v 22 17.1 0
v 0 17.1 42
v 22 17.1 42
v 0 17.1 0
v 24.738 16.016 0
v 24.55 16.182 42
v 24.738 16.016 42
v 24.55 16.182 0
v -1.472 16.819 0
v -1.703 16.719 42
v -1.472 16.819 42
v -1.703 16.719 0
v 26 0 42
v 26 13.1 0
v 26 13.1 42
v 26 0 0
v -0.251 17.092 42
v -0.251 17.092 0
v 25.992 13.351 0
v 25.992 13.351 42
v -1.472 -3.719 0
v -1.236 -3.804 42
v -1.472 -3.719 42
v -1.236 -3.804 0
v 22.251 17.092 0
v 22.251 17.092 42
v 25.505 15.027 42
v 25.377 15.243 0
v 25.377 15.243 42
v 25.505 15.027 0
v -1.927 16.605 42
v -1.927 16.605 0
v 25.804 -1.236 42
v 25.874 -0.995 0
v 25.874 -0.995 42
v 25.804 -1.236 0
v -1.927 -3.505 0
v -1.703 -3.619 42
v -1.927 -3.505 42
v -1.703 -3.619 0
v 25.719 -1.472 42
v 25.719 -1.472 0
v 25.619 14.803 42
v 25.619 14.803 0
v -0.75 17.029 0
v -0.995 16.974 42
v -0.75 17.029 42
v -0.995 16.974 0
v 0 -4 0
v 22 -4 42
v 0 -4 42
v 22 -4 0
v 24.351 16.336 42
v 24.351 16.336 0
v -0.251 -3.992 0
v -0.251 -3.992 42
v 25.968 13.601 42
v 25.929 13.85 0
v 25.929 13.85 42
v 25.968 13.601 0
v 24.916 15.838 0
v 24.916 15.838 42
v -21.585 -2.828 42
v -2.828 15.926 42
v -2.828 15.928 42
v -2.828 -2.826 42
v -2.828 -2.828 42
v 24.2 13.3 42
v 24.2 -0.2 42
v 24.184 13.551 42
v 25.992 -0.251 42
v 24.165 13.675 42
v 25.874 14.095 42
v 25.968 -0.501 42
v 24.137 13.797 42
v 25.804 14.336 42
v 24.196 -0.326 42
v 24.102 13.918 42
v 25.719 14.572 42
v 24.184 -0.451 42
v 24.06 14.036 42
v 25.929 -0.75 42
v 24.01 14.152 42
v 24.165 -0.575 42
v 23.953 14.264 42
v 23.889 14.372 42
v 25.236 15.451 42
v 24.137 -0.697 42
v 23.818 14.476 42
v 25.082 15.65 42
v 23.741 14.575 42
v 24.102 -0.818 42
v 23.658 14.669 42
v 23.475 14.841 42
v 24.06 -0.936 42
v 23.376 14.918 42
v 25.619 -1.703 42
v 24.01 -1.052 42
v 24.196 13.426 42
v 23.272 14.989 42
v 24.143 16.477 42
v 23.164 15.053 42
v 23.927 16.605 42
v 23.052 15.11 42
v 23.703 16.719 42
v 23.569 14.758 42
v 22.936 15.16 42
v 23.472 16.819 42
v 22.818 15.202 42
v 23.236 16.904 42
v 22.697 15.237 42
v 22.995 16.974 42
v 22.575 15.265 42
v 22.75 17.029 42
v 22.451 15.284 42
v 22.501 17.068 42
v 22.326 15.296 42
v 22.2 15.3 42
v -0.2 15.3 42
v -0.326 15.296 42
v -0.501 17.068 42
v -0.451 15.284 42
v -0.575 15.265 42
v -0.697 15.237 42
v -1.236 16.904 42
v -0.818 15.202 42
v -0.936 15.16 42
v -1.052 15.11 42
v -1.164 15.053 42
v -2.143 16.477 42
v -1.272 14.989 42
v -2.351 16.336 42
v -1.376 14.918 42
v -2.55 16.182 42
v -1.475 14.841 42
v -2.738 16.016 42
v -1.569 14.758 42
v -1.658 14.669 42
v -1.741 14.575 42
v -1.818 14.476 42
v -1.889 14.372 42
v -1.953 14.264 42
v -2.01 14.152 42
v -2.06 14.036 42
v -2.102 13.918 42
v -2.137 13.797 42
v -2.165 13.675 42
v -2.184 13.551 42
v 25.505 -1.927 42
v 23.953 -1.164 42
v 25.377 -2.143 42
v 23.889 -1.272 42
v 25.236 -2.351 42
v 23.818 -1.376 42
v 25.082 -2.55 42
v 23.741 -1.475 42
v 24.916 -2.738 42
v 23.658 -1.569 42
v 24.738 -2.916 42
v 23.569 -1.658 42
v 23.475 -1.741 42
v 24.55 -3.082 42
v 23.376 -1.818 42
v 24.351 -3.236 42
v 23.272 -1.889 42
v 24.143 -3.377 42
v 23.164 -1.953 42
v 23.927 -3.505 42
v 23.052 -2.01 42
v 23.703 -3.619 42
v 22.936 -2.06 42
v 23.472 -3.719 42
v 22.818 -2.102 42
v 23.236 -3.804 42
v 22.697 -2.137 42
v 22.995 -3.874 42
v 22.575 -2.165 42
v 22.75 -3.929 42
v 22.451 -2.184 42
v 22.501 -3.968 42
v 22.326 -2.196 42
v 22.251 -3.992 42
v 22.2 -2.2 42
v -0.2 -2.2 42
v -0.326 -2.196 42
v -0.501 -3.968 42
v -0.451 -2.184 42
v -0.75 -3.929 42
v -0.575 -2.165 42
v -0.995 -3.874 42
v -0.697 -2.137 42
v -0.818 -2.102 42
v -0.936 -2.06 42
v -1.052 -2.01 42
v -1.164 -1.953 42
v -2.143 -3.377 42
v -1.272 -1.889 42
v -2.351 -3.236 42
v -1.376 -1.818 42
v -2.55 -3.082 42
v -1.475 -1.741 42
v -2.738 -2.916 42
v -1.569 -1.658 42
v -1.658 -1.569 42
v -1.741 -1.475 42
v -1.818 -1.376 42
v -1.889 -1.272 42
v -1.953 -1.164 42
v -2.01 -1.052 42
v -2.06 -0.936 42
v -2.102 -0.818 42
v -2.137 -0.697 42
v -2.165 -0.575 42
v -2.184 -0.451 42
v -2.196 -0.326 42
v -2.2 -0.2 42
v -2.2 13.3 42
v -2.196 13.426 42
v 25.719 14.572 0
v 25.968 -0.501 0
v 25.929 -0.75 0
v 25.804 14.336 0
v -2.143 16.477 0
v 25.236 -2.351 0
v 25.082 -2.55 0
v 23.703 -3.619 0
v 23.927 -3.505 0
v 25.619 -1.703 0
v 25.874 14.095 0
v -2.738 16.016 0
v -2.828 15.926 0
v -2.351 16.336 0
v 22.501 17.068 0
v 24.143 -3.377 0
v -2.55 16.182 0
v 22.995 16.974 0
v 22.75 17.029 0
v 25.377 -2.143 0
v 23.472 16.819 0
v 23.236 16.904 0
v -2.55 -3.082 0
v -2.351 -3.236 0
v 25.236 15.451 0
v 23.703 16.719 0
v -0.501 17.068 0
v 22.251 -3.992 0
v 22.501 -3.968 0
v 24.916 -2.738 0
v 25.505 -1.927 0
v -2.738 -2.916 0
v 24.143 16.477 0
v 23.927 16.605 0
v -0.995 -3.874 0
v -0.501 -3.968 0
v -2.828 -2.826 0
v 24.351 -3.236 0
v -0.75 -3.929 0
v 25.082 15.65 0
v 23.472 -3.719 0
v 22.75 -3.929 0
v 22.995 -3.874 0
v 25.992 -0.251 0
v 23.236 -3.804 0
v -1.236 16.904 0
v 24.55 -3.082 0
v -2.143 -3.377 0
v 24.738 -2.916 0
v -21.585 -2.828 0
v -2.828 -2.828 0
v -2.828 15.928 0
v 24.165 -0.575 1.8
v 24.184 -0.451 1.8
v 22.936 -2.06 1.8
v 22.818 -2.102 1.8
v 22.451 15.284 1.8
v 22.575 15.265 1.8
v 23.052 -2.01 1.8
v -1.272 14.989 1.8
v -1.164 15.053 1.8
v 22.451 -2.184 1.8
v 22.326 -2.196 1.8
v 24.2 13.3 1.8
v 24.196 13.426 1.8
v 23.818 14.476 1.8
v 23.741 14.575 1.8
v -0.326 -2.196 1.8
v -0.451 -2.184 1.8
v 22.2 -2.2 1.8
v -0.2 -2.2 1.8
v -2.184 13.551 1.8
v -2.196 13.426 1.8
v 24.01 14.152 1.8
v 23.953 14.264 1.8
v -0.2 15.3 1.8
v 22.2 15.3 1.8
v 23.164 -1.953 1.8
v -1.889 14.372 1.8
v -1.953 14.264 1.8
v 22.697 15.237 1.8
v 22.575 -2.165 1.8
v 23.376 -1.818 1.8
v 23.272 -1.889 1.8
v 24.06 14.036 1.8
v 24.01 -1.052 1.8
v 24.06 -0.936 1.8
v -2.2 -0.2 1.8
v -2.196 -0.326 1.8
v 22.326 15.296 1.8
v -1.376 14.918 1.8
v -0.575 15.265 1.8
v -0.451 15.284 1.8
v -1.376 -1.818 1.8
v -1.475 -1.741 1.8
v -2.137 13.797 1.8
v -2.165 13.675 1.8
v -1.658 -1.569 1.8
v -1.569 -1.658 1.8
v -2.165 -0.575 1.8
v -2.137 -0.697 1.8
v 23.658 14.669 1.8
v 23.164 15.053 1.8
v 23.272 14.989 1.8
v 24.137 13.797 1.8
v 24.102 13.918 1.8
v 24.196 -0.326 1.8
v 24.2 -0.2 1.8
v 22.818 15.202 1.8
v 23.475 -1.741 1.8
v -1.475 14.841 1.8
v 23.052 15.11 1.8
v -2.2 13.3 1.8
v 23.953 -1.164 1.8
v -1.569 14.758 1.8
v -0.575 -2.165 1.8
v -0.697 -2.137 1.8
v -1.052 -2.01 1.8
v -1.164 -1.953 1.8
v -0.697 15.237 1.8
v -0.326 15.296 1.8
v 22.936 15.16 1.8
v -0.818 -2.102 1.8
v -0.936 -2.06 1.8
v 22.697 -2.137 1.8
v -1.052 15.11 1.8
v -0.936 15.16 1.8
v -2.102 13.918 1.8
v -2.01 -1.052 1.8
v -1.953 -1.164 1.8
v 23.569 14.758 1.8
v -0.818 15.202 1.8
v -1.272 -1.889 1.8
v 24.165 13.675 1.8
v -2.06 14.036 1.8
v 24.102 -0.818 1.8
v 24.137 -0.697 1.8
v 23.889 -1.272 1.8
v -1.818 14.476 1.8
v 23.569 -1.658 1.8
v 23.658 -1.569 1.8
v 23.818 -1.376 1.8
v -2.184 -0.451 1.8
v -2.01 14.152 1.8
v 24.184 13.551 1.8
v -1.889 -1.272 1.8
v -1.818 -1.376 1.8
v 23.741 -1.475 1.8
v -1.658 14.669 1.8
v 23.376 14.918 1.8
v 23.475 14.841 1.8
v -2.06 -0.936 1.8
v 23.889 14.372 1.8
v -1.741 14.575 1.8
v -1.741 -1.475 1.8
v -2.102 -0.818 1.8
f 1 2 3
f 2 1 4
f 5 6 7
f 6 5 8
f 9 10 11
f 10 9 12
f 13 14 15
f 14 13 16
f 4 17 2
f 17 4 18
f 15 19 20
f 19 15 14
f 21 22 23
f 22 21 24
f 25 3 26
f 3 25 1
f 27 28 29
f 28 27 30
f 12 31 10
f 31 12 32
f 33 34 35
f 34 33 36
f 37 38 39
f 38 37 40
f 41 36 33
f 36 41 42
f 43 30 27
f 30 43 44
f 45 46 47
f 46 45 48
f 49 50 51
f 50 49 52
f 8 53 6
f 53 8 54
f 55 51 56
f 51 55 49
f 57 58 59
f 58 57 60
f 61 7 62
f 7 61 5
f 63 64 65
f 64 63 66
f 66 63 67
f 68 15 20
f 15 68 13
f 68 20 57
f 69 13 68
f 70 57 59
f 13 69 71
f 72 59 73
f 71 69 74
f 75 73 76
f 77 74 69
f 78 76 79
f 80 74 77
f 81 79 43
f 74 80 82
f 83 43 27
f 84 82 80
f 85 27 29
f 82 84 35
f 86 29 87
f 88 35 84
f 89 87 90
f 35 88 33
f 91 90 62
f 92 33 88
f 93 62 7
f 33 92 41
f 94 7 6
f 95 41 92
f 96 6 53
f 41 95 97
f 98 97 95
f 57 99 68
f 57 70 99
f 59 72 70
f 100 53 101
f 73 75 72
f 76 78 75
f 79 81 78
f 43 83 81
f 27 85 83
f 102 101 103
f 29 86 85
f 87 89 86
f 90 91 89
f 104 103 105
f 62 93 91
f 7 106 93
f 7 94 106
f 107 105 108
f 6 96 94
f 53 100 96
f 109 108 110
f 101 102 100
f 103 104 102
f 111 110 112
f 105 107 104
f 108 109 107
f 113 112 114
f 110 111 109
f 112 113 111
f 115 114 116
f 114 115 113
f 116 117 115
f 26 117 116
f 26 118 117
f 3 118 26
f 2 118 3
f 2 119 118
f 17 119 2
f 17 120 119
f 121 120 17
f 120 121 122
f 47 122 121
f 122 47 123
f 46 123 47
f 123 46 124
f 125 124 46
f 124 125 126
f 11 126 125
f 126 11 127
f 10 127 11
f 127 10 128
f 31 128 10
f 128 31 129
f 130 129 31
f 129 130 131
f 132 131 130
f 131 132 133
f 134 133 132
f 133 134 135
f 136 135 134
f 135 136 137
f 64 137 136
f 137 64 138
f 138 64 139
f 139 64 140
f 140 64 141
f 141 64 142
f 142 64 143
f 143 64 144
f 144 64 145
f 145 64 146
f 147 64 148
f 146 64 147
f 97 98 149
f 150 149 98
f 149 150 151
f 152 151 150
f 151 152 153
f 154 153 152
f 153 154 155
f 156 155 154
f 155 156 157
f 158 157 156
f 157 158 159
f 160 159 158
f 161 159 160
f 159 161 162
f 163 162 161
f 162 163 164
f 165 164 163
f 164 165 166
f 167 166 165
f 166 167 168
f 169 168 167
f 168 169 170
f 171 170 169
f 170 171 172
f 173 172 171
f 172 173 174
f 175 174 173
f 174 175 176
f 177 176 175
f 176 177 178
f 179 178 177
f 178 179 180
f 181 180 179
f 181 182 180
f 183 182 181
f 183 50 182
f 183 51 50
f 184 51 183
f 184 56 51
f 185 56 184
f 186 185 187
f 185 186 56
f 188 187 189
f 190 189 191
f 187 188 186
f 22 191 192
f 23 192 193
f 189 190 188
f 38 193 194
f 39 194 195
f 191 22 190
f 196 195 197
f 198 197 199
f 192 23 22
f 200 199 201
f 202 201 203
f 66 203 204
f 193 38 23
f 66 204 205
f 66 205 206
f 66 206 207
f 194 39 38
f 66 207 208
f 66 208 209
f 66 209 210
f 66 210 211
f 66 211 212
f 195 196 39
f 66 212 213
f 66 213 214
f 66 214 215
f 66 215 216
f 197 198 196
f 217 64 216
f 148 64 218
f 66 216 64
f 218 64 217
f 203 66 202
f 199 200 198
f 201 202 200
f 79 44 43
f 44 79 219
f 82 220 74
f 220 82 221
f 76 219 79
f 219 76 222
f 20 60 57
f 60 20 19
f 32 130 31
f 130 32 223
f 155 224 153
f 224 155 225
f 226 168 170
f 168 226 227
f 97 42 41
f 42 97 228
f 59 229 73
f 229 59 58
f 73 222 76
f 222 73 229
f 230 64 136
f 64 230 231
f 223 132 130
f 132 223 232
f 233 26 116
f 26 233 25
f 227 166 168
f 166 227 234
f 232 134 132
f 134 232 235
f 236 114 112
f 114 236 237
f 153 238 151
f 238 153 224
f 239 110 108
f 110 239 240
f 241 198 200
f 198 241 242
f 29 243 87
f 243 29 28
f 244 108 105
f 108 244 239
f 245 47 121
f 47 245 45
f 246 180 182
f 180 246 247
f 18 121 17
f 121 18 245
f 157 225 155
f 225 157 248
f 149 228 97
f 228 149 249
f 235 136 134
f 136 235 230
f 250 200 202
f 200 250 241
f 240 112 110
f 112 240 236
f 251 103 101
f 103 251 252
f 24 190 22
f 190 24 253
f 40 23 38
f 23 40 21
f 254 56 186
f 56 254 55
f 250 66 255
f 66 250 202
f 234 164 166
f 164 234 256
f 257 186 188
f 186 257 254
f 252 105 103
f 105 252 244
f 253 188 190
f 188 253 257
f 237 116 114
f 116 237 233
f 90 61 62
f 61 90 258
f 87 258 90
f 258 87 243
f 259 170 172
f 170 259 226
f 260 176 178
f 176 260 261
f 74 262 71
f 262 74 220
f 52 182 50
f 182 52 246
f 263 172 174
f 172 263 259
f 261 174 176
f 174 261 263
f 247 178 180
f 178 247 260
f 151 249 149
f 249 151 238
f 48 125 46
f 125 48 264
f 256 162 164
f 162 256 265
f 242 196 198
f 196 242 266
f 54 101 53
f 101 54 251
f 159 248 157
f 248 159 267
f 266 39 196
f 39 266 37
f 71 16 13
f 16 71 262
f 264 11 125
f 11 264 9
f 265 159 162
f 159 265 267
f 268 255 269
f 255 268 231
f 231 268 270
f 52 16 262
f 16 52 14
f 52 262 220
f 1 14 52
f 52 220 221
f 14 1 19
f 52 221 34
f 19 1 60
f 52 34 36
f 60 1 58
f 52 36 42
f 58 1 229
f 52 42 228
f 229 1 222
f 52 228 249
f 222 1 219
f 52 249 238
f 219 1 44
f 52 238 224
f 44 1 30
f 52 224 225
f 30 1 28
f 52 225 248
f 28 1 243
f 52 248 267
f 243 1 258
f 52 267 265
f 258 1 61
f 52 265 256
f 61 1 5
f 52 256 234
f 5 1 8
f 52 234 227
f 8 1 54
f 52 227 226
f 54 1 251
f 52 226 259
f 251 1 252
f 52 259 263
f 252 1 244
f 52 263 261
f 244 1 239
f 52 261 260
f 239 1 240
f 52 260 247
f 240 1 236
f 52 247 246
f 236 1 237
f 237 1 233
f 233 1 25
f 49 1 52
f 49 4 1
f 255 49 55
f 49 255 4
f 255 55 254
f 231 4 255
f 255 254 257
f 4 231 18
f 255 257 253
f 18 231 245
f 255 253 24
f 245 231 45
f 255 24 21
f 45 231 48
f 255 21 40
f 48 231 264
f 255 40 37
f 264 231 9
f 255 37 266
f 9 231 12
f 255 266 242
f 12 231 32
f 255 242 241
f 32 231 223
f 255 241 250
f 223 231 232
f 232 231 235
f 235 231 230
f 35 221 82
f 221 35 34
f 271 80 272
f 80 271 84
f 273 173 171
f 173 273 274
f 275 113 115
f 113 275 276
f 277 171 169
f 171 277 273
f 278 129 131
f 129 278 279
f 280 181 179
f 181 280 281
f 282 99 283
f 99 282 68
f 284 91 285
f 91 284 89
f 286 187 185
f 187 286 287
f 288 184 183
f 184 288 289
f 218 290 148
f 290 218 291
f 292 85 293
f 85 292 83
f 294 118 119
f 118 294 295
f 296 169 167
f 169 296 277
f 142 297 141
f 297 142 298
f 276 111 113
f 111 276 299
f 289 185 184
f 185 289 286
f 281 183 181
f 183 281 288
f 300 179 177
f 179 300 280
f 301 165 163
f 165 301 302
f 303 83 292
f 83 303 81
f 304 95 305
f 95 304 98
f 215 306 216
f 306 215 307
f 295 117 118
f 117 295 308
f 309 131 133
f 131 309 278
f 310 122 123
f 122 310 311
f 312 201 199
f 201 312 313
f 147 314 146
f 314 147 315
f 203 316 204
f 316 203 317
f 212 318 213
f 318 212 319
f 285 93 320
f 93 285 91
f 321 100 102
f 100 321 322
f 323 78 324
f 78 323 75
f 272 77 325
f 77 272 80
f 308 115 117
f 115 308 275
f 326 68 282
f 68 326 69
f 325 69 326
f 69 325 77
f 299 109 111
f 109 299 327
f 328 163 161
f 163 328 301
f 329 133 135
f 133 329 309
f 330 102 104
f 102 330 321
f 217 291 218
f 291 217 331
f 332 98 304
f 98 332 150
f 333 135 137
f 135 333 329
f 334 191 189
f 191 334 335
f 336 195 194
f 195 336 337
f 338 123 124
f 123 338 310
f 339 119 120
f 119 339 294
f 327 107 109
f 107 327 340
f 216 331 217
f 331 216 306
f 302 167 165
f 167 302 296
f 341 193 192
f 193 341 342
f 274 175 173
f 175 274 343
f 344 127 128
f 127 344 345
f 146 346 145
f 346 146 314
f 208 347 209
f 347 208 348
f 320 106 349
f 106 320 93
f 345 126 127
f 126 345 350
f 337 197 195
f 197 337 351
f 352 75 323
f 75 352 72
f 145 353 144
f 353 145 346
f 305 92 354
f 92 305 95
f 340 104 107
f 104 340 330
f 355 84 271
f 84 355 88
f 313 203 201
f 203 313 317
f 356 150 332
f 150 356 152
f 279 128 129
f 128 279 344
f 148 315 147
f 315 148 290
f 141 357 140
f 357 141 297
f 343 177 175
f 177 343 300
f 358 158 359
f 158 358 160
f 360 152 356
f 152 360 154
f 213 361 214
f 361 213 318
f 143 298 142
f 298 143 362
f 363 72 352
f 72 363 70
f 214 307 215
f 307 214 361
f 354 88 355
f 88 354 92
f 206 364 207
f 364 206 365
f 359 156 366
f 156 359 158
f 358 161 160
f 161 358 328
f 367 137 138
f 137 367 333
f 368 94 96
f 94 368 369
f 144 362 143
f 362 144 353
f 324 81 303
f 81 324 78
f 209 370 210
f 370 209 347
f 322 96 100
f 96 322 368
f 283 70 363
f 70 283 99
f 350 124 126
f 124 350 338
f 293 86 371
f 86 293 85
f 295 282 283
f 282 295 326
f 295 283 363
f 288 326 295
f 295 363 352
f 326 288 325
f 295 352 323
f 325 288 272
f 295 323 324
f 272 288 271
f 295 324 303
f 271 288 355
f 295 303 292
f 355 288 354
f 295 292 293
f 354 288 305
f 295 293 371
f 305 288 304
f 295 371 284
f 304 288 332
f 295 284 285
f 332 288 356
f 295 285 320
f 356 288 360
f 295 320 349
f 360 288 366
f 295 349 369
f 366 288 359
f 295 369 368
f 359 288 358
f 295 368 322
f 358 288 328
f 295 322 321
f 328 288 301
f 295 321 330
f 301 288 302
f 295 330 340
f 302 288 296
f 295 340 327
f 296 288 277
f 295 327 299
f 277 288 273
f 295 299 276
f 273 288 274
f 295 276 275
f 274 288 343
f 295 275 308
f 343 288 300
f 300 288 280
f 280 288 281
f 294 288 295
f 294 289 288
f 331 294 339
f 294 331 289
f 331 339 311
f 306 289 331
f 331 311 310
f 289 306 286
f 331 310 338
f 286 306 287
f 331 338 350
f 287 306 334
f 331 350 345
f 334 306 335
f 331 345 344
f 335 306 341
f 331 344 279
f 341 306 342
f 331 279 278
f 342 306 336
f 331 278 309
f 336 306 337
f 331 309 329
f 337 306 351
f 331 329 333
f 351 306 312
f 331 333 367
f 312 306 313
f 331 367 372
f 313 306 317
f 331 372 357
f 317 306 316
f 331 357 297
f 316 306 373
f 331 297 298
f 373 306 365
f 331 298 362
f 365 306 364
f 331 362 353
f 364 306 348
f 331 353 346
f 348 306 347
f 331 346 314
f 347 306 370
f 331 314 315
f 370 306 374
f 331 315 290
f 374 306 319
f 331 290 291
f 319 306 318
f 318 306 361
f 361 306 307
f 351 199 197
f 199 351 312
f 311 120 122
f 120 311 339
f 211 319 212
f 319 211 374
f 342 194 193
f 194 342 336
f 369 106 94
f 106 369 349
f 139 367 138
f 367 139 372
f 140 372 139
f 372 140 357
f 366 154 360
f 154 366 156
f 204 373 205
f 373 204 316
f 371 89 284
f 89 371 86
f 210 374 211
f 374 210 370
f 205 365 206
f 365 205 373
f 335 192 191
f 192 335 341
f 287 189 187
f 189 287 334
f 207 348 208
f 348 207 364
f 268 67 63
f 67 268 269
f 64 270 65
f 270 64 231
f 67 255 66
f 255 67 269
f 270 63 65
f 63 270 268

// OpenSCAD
// 9v battery battery box
//34567891123456789212345678931234567894123456789512345678961234567897123456789
$fn = 100;


module Box9V(l=26, w=17.1, h=42, ws=2.0, r=4.0, t=0.2,
        taperR=false, taperL=true) {
    // Rounded box with open top, sized for the average 9v battery
    union() {
        difference() {
            hull() {
                cylinder(h=h, r=r, center=false);
                translate([0,w-2*(r-ws),0])
                    cylinder(h=h, r=r, center=false);
                translate([l-2*(r-ws),w-2*(r-ws),0])
                    cylinder(h=h, r=r, center=false);
                translate([l-2*(r-ws),0,0])
                    cylinder(h=h, r=r, center=false);
            }
            hull() {
                translate([-t,-t,ws-t])
                    cylinder(h=h*2, r=r-ws, center=false);
                translate([-t,(w-2*(r-ws))+t,ws-t])
                    cylinder(h=h*2, r=r-ws, center=false);
                translate([(l-2*(r-ws))+t,(w-2*(r-ws))+t,ws-t])
                    cylinder(h=h*2, r=r-ws, center=false);
                translate([(l-2*(r-ws))+t,-t,ws-t])
                    cylinder(h=h*2, r=r-ws, center=false);
            }
        }
        if(taperR) {
            linear_extrude(height=h, center=false, convexity=5, twist=0) {
                polygon( points=[
                    [l-2*(r-ws)+sqrt(r*r/2),(w-2*(r-ws))+sqrt(r*r/2)],
                    [l-2*(r-ws)+((w-2*(r-ws))+3*sqrt(r*r/2)),-sqrt(r*r/2)],
                    [l-2*(r-ws)+sqrt(r*r/2),-sqrt(r*r/2)],
                    [l-2*(r-ws)+sqrt(r*r/2),(w-2*(r-ws))+sqrt(r*r/2)]]);
            }
        }
        if(taperL) {
            linear_extrude(height=h, center=false, convexity=5, twist=0) {
                polygon( points=[[-sqrt(r*r/2),(w-2*(r-ws))+sqrt(r*r/2)],
                    [-((w-2*(r-ws))+3*sqrt(r*r/2)),-sqrt(r*r/2)],
                    [-sqrt(r*r/2),-sqrt(r*r/2)],
                    [-sqrt(r*r/2),(w-2*(r-ws))+sqrt(r*r/2)]]);
            }
        }
    }
}

Box9V();
